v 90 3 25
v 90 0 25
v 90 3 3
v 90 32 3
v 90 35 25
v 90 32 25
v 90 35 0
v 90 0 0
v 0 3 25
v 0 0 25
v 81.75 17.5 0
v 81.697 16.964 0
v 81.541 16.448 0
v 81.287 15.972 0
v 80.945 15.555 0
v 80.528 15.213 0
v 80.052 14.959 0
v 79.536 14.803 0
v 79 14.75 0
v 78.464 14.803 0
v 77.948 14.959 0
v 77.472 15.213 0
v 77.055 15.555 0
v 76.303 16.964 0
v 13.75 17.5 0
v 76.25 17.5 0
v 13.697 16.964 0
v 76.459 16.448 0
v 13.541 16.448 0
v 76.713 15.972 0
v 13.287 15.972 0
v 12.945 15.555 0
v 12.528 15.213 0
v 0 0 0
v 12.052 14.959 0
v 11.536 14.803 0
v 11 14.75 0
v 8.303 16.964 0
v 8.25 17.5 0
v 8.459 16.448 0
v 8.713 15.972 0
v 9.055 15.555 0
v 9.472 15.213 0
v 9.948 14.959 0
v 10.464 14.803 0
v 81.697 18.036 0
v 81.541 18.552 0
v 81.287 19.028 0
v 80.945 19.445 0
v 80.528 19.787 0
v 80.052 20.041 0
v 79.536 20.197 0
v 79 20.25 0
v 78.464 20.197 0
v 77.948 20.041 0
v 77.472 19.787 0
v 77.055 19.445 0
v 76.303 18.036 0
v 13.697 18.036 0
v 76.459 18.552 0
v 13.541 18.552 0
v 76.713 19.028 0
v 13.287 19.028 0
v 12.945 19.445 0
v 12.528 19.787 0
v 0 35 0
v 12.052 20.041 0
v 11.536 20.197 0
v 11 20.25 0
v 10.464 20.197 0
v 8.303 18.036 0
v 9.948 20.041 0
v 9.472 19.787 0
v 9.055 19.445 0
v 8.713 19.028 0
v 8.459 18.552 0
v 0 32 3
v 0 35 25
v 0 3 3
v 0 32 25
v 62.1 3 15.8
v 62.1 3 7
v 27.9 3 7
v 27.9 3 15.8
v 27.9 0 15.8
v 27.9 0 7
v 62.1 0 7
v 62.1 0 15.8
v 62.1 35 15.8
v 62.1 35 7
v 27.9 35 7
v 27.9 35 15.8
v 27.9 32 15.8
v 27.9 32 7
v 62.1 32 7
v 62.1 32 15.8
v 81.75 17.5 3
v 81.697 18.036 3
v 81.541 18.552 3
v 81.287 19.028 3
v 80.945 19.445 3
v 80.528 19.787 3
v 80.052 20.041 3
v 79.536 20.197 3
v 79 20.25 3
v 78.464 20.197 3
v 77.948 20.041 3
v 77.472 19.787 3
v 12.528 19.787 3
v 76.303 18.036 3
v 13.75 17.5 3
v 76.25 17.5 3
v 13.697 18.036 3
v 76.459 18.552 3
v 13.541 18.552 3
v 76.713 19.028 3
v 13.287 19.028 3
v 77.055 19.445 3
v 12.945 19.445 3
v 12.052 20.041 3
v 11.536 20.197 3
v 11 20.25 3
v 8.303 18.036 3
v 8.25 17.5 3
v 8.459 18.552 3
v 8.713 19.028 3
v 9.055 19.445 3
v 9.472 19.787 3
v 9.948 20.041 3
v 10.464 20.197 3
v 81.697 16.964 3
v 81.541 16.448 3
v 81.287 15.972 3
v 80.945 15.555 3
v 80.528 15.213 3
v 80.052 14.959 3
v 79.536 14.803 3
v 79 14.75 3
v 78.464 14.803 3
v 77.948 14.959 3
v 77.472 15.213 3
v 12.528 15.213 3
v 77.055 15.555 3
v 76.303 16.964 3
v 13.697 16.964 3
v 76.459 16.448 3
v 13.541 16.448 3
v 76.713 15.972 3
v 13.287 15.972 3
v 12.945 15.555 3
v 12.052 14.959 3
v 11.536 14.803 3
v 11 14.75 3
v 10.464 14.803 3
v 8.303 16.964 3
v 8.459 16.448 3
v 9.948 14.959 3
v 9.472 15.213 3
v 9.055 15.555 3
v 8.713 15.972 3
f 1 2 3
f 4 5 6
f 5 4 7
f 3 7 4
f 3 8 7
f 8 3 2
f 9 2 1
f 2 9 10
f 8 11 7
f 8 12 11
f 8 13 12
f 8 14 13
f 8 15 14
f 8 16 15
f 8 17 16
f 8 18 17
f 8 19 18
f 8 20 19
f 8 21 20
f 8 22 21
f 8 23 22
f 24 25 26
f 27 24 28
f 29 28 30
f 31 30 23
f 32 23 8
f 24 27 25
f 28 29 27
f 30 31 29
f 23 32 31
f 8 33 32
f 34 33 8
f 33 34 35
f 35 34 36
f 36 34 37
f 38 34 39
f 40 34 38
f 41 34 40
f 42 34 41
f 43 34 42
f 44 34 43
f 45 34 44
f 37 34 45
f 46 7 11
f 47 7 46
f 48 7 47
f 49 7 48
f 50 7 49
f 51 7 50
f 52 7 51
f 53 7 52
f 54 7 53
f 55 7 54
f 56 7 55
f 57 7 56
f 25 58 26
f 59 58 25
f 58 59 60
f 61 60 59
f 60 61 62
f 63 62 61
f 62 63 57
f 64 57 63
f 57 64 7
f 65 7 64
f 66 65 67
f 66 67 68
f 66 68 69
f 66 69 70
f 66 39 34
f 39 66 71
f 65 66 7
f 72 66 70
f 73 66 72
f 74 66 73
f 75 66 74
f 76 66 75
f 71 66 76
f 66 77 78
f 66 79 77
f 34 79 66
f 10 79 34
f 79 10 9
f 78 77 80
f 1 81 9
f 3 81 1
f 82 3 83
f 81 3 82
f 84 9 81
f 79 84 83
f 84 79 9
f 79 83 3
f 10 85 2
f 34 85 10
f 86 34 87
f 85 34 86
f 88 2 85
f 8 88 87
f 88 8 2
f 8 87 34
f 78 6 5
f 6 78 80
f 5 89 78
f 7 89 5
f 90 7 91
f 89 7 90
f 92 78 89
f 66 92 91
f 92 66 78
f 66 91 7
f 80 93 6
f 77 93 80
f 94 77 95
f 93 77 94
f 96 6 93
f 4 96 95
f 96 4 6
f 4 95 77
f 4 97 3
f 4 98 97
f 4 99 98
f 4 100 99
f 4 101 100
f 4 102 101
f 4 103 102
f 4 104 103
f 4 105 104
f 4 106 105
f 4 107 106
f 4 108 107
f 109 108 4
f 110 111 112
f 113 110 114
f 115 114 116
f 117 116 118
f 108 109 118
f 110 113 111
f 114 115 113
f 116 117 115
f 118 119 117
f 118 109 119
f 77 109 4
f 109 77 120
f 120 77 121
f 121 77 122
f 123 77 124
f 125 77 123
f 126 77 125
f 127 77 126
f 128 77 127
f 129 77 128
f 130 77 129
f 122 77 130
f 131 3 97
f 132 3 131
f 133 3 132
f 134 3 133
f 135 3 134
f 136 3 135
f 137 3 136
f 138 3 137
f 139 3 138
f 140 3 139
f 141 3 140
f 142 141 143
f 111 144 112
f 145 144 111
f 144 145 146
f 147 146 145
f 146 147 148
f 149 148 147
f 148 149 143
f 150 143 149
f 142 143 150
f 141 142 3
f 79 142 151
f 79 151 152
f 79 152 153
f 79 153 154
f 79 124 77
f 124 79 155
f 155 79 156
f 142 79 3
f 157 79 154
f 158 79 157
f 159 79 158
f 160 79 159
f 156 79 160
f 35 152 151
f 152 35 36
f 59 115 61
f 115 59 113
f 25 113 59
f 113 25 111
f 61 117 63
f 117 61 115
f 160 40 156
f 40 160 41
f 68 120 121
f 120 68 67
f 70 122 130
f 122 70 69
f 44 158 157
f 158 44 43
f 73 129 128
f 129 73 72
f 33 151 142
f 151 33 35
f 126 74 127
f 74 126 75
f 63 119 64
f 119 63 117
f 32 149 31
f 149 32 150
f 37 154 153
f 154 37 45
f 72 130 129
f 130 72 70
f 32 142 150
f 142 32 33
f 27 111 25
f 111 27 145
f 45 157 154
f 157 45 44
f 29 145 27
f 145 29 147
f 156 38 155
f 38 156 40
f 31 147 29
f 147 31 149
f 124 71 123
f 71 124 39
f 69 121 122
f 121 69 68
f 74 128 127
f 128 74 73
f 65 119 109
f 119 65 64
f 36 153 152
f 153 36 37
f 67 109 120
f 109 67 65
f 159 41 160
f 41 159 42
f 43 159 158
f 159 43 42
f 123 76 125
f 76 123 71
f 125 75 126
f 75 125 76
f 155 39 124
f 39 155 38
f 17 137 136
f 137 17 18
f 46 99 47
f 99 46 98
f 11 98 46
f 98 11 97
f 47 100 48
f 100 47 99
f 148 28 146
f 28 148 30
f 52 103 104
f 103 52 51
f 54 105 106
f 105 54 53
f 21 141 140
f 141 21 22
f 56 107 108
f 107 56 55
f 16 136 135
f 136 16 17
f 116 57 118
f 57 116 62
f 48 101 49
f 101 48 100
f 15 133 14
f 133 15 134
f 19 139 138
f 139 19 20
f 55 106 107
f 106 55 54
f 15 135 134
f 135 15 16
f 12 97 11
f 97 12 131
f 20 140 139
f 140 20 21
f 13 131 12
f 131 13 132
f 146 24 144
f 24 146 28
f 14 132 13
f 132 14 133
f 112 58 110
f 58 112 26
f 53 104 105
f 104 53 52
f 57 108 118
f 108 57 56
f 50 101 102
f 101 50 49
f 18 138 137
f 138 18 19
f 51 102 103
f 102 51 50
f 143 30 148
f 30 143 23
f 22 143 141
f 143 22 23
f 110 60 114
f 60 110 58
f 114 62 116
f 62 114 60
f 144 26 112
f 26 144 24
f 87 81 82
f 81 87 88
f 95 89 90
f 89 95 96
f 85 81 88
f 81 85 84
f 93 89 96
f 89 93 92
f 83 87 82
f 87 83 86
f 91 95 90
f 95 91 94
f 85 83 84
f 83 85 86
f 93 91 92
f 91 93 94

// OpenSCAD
$fn = 32;

// ----------------------------------------------------------------------
// U-bracket: 90 x 35 x 25 mm
// ----------------------------------------------------------------------

// --- parameters (mm) ---
span = 90;                // outer length, X
outer_w = 35;             // outer width, Y
wall_h = 25;              // upright height, Z
plate_t = 3;              // wall thickness
hole_d = 5.5;             // clearance for M5
window_l = 34.2;          // window length
window_h = 8.8;           // window height

module hole_z(px, py) {
  translate([px, py, -2.5]) cylinder(h = plate_t + 5, d = hole_d);
}
module hole_y_pz(pz) {
  /* through both uprights along Y */
  translate([0, -2.5, pz]) rotate([-90, 0, 0]) cylinder(h = outer_w + 5, d = hole_d);
}

module base() {
  cube([span, outer_w, plate_t]);
}

module uprights() {
  cube([span, plate_t, wall_h]);
  translate([0, outer_w - plate_t, 0]) cube([span, plate_t, wall_h]);
}

difference() {
  union() {
    base();
    uprights();
  }
  hole_z(11, 17.5);
  hole_z(79, 17.5);
  /* lightening window through both uprights */
  translate([span / 2 - window_l / 2, -1, plate_t + 4])
    cube([window_l, outer_w + 2, window_h]);
}
